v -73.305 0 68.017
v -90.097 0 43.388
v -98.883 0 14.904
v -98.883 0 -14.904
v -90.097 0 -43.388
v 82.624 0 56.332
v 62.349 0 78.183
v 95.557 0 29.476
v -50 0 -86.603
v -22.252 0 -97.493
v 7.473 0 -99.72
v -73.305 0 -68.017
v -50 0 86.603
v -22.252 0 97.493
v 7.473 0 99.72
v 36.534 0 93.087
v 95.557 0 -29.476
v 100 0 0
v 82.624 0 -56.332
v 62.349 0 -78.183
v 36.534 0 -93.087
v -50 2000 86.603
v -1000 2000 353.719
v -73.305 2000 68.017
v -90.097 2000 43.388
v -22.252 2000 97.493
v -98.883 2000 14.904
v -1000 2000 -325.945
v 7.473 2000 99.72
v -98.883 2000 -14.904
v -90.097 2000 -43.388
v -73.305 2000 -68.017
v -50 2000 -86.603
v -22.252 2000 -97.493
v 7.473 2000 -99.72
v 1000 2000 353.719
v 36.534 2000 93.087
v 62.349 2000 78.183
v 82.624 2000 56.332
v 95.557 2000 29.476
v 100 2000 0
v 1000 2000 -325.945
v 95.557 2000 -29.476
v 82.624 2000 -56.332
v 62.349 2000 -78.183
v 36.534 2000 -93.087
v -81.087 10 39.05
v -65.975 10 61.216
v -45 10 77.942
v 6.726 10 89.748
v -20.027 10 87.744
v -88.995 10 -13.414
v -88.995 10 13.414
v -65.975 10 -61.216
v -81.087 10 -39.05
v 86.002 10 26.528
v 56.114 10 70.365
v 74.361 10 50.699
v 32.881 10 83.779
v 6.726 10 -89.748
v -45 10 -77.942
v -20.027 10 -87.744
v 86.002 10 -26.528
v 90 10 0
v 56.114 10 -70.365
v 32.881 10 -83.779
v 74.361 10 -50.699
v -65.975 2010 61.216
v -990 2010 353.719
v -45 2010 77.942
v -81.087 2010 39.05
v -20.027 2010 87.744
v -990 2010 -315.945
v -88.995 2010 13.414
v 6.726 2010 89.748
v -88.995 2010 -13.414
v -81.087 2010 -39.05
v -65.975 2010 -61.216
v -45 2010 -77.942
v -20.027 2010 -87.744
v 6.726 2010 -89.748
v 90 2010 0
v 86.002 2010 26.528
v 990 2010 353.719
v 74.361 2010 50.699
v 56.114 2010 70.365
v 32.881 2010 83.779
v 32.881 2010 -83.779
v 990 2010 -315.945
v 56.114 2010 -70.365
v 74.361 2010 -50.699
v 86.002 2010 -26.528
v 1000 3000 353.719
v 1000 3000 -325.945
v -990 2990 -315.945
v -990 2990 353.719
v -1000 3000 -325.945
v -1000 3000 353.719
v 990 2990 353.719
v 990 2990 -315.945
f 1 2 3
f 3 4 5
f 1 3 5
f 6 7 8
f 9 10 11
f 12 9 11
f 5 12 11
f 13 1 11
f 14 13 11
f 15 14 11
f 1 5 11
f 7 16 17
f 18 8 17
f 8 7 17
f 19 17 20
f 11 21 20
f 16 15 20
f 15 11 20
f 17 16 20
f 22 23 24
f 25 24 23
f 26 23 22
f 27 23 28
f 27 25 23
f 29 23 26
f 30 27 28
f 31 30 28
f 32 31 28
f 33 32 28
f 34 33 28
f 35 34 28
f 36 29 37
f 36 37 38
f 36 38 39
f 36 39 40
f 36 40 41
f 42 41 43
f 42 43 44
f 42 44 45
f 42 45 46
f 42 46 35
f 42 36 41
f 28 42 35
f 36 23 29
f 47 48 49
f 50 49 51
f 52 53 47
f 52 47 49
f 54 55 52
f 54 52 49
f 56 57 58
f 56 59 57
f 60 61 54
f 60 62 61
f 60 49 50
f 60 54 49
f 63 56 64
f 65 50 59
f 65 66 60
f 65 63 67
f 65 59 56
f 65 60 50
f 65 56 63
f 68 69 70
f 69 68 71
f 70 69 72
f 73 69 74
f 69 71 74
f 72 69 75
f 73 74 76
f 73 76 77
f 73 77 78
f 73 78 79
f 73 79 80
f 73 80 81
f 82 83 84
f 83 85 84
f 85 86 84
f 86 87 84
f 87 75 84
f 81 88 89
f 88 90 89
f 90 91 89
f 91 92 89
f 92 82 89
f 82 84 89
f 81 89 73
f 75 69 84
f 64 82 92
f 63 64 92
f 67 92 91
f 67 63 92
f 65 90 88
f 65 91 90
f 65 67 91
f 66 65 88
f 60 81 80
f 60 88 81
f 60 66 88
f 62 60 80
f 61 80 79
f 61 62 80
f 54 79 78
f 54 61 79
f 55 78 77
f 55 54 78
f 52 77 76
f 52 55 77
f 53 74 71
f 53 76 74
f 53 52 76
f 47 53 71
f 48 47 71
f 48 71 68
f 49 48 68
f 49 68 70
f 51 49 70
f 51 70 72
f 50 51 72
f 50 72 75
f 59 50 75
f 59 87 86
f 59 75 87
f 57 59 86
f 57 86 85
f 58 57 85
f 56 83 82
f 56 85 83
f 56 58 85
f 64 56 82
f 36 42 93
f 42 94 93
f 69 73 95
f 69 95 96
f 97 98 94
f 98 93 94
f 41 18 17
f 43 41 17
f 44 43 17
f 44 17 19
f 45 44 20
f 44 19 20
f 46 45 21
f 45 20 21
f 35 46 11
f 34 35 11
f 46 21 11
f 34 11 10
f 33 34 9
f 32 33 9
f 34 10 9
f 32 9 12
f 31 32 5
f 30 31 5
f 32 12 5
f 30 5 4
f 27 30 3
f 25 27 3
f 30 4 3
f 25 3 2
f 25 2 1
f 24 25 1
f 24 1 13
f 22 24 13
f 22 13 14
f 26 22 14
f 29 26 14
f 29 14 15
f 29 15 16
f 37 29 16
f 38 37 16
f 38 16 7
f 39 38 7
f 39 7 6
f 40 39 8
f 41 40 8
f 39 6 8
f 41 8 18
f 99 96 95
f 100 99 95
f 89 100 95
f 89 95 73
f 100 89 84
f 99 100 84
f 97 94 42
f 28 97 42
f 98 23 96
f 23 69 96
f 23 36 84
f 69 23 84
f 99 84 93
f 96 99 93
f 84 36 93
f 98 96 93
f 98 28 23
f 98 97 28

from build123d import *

# Parameters (mm, degrees)
SKETCH2_R           = 100
BOSS_EXTRUDE1_DEPTH = 2000
BOSS_EXTRUDE2_DEPTH = 1000
SHELL1_T            = -10


with BuildPart() as part:
    # Sketch2 → Boss-Extrude1 (new body)
    with BuildSketch(Plane(origin=(0, 0, 0), x_dir=(1, 0, 0), z_dir=(0, 1, 0))):
        Circle(SKETCH2_R)
    extrude(amount=BOSS_EXTRUDE1_DEPTH)

    # Sketch3 → Boss-Extrude2 (add, symmetric)
    with BuildSketch(Plane(origin=(0, 0, 0), x_dir=(0, 0, -1), z_dir=(1, 0, 0))):
        Polygon((0, 2000), (-353.719295441, 2000), (-353.719295441, 3000), (325.945022222, 3000), (325.945022222, 2000), align=None)
    extrude(amount=BOSS_EXTRUDE2_DEPTH, both=True)

    # Shell1
    shell1_openings = [part.faces().sort_by_distance(p)[0] for p in [
        (0, 2500, 353.719295441),
    ]]
    offset(amount=SHELL1_T, openings=shell1_openings, kind=Kind.INTERSECTION)


solid = part.part
